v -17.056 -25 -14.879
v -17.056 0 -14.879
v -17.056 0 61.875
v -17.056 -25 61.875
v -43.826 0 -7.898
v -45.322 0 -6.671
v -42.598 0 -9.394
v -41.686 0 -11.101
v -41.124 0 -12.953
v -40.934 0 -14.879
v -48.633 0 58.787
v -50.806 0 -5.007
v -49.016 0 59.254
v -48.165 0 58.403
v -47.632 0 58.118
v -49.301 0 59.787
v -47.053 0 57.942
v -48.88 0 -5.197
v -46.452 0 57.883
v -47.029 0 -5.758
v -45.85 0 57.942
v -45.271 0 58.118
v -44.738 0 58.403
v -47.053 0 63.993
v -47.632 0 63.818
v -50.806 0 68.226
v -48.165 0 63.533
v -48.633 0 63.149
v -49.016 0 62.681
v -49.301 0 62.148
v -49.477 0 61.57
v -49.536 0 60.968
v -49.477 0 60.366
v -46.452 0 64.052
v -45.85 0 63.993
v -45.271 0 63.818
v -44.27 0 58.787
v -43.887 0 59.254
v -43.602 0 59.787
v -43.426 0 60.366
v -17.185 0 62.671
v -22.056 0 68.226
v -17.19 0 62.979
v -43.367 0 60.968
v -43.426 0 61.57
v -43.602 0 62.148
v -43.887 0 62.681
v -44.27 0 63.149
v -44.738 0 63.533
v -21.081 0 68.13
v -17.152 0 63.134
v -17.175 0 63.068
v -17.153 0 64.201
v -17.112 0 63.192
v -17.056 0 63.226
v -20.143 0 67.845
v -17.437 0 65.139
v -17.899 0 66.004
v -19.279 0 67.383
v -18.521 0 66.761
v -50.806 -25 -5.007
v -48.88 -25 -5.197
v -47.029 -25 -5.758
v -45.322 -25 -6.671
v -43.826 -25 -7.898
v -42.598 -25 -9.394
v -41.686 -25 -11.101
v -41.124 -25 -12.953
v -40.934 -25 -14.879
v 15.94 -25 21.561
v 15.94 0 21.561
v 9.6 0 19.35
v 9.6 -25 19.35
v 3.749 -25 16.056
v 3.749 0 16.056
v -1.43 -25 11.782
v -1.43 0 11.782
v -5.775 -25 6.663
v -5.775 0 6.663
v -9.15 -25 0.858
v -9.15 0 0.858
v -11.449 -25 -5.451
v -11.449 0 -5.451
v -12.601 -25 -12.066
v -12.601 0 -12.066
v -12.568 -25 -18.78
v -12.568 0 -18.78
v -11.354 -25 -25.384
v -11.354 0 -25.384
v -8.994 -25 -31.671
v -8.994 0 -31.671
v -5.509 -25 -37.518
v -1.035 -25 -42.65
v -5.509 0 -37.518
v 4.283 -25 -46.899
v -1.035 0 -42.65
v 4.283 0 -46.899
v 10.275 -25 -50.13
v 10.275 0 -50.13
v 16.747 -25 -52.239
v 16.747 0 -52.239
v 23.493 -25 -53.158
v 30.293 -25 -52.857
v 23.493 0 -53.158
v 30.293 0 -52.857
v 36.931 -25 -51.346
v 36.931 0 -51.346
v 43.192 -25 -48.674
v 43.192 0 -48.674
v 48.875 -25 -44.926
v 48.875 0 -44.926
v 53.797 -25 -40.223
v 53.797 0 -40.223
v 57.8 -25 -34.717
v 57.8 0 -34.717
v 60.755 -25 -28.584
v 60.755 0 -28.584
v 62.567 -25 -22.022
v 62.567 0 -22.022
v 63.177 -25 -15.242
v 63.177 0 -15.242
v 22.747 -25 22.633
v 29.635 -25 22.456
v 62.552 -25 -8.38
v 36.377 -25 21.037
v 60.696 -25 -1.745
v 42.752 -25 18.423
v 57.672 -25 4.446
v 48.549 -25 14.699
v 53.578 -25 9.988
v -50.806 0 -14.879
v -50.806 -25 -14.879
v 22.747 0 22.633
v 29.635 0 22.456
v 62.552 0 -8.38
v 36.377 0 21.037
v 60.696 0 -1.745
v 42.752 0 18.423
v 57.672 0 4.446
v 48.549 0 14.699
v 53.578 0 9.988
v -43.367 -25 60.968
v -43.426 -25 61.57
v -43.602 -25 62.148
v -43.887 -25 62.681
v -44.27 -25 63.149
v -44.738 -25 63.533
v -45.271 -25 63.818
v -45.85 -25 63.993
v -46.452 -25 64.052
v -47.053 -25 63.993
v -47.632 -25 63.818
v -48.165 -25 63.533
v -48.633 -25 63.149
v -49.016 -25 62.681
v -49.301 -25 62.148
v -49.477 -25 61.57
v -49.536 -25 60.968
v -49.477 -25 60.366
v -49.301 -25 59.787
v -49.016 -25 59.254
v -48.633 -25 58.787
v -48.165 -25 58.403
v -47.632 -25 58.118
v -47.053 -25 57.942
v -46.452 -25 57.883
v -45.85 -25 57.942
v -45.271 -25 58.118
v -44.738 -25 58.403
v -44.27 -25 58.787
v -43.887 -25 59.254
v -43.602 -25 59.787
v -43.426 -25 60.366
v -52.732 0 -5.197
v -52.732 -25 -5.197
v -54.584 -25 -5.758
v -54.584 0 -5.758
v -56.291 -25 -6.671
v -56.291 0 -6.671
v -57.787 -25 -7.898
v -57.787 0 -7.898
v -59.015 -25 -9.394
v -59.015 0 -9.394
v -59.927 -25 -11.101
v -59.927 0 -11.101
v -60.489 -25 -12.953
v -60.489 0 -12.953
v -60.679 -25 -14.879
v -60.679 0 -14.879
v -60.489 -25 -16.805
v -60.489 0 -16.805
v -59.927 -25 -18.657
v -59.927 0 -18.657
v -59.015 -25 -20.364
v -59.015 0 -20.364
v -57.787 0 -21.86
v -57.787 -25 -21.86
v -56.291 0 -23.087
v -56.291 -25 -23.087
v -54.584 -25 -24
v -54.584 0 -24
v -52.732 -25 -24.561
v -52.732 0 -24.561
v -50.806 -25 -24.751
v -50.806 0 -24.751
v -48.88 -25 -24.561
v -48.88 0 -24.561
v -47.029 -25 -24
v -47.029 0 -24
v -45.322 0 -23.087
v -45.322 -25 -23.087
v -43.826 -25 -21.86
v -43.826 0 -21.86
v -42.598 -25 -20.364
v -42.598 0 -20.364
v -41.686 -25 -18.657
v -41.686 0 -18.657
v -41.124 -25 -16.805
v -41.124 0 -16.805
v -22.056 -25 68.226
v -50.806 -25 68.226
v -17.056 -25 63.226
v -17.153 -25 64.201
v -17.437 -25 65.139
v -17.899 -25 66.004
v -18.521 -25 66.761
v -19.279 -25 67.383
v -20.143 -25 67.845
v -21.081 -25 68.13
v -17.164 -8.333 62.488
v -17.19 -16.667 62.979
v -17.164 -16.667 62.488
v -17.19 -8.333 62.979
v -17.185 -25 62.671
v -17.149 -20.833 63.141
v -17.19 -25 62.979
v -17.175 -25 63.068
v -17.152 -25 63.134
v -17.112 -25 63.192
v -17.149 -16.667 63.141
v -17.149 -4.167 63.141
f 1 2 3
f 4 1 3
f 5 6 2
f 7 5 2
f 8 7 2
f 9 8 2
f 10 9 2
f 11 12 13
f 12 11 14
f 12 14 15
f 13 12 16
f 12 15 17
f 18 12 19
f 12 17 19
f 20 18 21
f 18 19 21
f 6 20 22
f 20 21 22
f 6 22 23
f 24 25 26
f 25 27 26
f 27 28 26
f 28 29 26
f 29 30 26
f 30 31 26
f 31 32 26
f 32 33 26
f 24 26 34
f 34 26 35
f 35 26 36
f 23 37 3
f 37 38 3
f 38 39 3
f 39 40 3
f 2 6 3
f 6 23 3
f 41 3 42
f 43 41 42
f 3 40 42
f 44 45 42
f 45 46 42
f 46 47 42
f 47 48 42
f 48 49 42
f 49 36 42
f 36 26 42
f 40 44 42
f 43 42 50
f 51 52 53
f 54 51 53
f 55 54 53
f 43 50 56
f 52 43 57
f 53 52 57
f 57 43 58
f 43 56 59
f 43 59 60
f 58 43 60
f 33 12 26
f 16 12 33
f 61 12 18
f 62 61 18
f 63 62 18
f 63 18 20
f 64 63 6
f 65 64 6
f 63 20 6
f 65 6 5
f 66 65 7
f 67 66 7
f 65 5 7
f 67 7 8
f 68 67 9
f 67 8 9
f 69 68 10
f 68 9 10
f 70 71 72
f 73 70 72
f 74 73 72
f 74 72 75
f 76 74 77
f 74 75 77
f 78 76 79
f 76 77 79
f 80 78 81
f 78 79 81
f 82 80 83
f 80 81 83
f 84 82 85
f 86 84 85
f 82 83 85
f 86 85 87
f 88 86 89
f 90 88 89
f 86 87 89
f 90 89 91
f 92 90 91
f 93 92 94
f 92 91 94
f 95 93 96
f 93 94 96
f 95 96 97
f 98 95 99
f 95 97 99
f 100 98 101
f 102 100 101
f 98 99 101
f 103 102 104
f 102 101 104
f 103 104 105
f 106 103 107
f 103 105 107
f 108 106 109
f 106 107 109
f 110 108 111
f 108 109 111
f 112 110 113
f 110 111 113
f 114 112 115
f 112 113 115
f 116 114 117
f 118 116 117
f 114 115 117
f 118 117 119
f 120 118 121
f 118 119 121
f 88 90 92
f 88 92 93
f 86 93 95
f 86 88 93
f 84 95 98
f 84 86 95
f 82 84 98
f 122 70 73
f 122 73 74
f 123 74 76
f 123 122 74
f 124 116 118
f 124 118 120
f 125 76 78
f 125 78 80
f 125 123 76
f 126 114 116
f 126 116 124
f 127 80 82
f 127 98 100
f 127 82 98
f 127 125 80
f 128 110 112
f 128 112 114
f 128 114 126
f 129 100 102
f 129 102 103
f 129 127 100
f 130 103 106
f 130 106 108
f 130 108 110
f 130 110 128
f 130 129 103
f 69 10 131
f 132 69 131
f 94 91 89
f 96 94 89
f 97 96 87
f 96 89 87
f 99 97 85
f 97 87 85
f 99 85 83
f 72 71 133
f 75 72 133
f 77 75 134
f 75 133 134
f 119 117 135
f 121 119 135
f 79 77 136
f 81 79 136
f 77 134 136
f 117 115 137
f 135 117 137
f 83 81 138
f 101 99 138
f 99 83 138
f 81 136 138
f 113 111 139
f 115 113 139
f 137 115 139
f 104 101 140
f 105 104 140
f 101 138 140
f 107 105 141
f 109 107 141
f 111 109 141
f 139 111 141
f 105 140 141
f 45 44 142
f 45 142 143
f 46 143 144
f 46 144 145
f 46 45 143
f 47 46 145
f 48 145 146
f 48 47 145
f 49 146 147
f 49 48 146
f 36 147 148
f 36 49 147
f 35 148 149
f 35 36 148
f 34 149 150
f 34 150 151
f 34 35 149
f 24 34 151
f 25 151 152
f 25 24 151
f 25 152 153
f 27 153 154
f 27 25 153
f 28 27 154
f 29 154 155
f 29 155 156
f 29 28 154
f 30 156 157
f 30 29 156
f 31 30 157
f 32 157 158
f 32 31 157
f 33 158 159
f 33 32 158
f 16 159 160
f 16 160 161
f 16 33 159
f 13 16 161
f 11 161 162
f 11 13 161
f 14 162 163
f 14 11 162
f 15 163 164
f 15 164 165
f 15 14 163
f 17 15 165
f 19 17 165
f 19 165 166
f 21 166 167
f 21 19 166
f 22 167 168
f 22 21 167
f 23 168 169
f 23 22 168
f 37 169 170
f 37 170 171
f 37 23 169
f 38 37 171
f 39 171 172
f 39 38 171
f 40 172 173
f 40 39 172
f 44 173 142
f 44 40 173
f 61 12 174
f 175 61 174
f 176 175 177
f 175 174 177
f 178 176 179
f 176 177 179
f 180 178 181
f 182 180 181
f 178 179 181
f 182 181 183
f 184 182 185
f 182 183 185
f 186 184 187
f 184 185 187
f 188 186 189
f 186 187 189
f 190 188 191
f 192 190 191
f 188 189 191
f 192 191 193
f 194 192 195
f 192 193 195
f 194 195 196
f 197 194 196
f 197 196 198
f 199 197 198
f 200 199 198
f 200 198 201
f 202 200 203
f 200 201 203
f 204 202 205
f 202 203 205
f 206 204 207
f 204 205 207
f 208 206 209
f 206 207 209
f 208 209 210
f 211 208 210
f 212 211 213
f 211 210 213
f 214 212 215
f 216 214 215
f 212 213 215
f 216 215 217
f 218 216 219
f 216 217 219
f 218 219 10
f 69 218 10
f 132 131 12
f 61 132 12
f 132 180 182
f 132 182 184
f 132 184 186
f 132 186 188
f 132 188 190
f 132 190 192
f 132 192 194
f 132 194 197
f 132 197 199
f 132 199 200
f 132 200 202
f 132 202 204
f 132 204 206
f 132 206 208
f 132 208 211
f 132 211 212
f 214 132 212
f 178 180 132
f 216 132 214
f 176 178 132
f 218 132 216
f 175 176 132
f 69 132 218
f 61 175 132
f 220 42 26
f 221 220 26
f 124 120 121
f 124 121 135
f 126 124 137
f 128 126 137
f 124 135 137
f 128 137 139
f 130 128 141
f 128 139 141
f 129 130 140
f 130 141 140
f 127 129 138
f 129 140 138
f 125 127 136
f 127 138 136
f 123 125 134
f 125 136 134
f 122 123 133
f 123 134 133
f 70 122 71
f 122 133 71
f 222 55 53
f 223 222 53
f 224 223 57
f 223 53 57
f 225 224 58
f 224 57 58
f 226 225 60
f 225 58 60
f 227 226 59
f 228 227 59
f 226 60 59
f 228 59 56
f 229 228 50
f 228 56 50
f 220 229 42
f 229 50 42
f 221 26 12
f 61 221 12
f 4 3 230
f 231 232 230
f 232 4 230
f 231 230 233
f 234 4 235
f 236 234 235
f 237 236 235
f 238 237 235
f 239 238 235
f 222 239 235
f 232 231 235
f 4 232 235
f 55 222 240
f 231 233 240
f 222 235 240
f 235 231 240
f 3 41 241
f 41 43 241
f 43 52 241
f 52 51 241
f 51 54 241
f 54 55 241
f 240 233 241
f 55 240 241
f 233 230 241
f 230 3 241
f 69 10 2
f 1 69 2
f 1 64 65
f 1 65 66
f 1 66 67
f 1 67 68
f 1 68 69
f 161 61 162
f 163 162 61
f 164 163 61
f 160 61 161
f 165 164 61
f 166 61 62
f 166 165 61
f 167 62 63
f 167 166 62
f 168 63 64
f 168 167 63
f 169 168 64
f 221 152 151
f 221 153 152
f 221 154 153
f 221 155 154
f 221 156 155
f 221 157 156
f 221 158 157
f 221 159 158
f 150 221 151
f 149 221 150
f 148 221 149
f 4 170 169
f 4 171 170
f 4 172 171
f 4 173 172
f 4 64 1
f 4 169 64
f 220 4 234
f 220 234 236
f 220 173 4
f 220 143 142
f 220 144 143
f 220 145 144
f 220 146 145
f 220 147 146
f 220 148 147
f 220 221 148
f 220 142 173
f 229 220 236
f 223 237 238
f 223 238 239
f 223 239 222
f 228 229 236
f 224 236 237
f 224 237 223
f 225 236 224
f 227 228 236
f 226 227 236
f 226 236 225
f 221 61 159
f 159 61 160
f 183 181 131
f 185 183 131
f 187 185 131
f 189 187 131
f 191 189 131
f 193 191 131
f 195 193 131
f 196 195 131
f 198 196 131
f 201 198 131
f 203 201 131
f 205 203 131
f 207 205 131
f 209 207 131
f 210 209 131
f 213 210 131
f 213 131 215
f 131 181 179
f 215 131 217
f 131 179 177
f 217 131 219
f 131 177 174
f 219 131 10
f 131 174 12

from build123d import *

# Parameters (mm, degrees)
F1_DEPTH = 25
F0_R     = 3.0846782029


with BuildPart() as f1:
    # F0 (on Front) → F1 (new body)
    with BuildSketch(Plane.XZ):
        with BuildLine():
            ThreePointArc((15.940215423, 21.5612740448), (-9.1499095049, 0.8580905451), (-8.9940761195, -31.6705413332))
            ThreePointArc((-8.9940761195, -31.6705413332), (33.6462109509, -52.250752754), (63.177324287, -15.2419358492))
            ThreePointArc((63.177324287, -15.2419358492), (48.5491946598, 14.6989254958), (15.940215423, 21.5612740448))
        make_face()
    extrude(amount=F1_DEPTH)


with BuildPart() as f1b:
    # F0 (on Front) → F1, piece 2 (new body)
    with BuildSketch(Plane.XZ):
        with BuildLine():
            Line((-40.9343125656, -14.8790329695), (-17.0564521104, -14.8790329695))
            Line((-17.0564521104, -14.8790329695), (-17.0564521104, 61.875000596))
            add(Edge.make_bspline(
                [(-17.0564521104, 61.875000596), (-17.1770810796, 62.5084030386), (-17.2974830979, 63.141950965), (-17.0564521104, 63.2258084416)],
                knots=[0, 0, 0, 0, 0.1375026192, 0.1375026192, 0.1375026192, 0.1375026192], degree=3))
            ThreePointArc((-17.0564521104, 63.2258084416), (-18.5209182045, 66.7613423476), (-22.0564521104, 68.2258084416))
            Line((-22.0564521104, 68.2258084416), (-50.8064534515, 68.2258084416))
            Line((-50.8064534515, 68.2258084416), (-50.8064534515, -5.0068920836))
            ThreePointArc((-50.8064534515, -5.0068920836), (-43.8257956863, -7.8983752042), (-40.9343125656, -14.8790329695))
        make_face()
        with Locations((-46.451613307, 60.9677433968)):
            Circle(F0_R, mode=Mode.SUBTRACT)
    extrude(amount=F1_DEPTH)


with BuildPart() as f1c:
    # F0 (on Front) → F1, piece 3 (new body)
    with BuildSketch(Plane.XZ):
        with BuildLine():
            ThreePointArc((-50.8064534515, -5.0068920836), (-57.7871112168, -21.8596907347), (-40.9343125656, -14.8790329695))
            Line((-40.9343125656, -14.8790329695), (-50.8064534515, -14.8790329695))
            Line((-50.8064534515, -14.8790329695), (-50.8064534515, -5.0068920836))
        make_face()
    extrude(amount=F1_DEPTH)


solid = Compound([f1.part, f1b.part, f1c.part])
